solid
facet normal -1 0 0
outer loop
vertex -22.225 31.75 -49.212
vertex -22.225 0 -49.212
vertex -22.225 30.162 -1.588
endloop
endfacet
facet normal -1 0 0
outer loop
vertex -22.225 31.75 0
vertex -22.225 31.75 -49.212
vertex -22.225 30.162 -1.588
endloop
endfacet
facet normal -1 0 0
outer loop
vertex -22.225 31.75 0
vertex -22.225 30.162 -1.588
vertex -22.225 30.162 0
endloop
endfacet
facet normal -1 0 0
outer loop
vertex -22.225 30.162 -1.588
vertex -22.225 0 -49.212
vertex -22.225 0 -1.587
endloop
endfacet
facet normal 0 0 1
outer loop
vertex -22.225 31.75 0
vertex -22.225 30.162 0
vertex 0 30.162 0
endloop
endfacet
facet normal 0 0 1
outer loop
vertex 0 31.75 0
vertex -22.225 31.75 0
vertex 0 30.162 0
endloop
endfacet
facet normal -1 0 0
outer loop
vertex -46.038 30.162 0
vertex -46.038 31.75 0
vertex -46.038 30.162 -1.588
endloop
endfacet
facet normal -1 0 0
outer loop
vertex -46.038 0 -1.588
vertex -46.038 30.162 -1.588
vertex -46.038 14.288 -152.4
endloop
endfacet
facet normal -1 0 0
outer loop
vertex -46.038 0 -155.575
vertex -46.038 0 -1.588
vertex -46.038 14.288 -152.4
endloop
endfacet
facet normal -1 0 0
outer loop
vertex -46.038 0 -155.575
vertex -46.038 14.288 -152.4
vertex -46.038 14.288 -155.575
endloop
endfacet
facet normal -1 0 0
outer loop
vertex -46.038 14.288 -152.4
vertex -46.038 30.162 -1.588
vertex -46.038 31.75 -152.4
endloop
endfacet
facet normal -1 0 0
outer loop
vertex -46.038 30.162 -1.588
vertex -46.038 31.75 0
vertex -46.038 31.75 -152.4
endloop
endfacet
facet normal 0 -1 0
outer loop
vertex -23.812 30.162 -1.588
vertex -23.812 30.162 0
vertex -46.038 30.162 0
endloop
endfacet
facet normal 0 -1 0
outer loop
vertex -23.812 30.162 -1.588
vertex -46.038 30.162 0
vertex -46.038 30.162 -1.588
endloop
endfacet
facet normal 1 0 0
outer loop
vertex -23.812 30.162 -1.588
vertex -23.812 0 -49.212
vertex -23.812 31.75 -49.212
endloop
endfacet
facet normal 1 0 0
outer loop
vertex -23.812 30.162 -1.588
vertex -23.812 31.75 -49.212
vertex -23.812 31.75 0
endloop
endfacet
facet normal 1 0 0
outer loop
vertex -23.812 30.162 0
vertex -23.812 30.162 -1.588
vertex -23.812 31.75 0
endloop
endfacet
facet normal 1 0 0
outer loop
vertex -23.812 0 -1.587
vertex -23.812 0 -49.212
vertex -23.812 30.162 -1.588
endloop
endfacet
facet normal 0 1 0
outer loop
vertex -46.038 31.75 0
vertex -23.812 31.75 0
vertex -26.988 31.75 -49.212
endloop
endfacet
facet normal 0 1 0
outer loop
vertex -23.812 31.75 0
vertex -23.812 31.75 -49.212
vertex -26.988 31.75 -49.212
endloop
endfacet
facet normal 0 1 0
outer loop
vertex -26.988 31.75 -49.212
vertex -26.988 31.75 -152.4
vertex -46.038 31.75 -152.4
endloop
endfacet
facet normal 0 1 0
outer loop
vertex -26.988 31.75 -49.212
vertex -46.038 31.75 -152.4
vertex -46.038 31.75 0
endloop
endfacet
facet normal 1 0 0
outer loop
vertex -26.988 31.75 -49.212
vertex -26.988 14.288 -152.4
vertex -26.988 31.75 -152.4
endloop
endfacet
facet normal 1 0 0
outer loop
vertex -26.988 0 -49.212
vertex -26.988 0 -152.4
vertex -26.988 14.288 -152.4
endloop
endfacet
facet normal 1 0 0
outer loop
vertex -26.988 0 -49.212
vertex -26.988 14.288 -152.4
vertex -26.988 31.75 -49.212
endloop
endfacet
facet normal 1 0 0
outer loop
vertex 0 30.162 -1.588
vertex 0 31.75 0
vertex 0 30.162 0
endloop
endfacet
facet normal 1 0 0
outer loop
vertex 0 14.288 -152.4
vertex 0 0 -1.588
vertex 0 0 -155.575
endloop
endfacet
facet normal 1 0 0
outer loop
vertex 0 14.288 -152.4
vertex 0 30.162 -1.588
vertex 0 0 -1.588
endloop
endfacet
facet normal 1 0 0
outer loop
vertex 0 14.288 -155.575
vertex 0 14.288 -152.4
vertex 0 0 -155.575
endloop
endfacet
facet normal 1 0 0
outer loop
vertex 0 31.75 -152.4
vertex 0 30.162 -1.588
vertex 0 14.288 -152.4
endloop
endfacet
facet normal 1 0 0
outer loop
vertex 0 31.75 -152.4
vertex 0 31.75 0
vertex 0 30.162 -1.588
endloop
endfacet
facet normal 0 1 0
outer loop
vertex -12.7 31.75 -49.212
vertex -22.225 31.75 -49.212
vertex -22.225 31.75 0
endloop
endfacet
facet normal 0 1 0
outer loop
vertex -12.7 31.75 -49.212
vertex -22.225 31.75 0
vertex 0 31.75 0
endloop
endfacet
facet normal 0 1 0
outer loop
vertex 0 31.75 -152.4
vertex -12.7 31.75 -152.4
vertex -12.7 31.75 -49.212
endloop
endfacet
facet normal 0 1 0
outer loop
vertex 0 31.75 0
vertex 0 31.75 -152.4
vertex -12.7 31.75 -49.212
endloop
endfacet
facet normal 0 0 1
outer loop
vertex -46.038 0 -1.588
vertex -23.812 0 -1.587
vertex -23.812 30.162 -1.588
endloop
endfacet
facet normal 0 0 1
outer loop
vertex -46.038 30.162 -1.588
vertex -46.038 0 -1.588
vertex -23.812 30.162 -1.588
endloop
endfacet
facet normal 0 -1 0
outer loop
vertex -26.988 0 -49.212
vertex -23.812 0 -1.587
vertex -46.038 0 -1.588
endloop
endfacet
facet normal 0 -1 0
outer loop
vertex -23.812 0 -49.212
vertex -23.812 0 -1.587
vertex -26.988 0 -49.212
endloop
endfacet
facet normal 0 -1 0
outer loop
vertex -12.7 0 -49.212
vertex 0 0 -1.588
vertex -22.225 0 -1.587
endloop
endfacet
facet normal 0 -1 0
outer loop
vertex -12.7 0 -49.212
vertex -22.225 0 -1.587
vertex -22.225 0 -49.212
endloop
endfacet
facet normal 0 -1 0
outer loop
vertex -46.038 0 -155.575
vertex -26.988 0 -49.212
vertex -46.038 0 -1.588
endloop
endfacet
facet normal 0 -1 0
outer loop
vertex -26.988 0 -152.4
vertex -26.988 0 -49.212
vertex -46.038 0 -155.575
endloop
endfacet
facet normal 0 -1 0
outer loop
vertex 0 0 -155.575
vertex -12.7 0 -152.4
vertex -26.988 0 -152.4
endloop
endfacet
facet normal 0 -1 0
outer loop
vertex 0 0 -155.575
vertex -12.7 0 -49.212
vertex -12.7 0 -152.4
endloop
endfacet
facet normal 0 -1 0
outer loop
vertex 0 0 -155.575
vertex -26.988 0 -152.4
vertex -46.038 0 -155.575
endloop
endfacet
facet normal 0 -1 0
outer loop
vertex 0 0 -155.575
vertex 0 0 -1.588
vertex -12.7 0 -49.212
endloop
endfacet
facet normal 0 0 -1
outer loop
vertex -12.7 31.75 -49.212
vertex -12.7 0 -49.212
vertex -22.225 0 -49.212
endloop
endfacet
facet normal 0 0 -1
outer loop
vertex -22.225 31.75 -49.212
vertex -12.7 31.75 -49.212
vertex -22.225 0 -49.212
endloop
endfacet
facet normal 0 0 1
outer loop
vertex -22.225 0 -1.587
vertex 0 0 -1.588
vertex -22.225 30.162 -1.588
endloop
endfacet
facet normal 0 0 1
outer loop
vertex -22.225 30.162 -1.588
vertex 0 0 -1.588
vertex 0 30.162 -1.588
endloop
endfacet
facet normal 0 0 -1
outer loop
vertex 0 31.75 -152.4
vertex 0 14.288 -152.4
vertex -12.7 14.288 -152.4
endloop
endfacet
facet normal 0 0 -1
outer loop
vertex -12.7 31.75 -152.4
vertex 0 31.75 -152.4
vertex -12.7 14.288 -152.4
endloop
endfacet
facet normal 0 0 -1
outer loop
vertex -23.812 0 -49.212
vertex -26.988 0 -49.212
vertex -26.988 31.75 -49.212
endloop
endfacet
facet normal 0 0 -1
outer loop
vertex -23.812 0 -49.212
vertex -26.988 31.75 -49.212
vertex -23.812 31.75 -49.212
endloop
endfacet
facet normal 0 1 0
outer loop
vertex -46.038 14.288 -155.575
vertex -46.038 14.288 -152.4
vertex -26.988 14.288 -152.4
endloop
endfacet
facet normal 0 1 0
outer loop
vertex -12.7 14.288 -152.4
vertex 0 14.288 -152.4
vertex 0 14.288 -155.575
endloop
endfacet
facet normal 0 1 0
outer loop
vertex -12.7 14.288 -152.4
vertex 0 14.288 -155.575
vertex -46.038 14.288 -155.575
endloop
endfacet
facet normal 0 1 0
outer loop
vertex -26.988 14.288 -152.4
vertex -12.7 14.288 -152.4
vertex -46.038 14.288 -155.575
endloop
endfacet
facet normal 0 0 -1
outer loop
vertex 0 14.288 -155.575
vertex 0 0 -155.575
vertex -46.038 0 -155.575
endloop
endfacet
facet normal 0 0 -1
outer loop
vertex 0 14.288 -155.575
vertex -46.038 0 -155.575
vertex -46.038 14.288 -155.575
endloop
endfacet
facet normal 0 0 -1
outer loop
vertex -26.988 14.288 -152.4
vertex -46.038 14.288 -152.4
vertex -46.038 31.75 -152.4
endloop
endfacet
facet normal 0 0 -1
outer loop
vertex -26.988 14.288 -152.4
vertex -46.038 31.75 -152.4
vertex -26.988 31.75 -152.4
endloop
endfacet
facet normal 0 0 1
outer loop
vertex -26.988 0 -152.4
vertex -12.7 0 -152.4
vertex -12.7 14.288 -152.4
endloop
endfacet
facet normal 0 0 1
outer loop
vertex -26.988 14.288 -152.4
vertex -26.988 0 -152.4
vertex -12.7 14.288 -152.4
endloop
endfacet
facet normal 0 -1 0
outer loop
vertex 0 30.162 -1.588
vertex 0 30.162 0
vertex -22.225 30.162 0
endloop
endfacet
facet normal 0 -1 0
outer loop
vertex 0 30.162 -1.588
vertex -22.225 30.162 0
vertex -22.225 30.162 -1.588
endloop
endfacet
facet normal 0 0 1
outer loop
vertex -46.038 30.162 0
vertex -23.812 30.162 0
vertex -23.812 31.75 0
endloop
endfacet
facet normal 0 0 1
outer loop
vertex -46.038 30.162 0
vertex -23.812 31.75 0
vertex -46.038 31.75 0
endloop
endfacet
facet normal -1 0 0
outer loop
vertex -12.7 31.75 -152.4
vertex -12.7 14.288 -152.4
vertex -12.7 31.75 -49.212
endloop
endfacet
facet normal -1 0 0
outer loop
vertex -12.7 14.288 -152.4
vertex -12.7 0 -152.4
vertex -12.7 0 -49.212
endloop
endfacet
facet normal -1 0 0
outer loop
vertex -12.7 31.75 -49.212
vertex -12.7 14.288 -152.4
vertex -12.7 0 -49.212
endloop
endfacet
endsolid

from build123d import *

# Parameters (mm, degrees)
BOSS_EXTRUDE1_DEPTH   = 31.75
BOSS_EXTRUDE1_2_DEPTH = 31.75
SKETCH2_W             = 1.5875
SKETCH2_H             = 30.1625
CUT_EXTRUDE1_DEPTH    = 47.0375
SKETCH3_W             = 3.175
SKETCH3_H             = 14.2875
BOSS_EXTRUDE2_DEPTH   = 46.0375


with BuildPart() as part:
    # Sketch1 → Boss-Extrude1 (new body)
    with BuildSketch(Plane(origin=(0, 0, 0), x_dir=(1, 0, 0), z_dir=(0, 1, 0))):
        Polygon((0, 0), (0, 152.4), (-12.7, 152.4), (-12.7, 49.2125), (-22.225, 49.2125), (-22.225, 0), align=None)
    extrude(amount=BOSS_EXTRUDE1_DEPTH)


with BuildPart() as body_2:
    # Sketch1 → Boss-Extrude1 2 (new body)
    with BuildSketch(Plane(origin=(0, 0, 0), x_dir=(1, 0, 0), z_dir=(0, 1, 0))):
        Polygon((-23.8125, 0), (-46.0375, 0), (-46.0375, 152.4), (-26.9875, 152.4), (-26.9875, 49.2125), (-23.8125, 49.2125), align=None)
    extrude(amount=BOSS_EXTRUDE1_2_DEPTH)


with BuildPart() as cut_extrude1_tool:
    # Sketch2 → Cut-Extrude1 (new body, through all)
    with BuildSketch(Plane(origin=(0, 0, 0), x_dir=(0, 0, -1), z_dir=(1, 0, 0))):
        with Locations((0.79375, 15.08125)):
            Rectangle(SKETCH2_W, SKETCH2_H)
    extrude(amount=-CUT_EXTRUDE1_DEPTH)


with BuildPart() as part_1:
    add(part.part)

    # Cut-Extrude1: cut by cut_extrude1_tool
    add(cut_extrude1_tool.part, mode=Mode.SUBTRACT)



with BuildPart() as body_2_1:
    add(body_2.part)

    # Cut-Extrude1: cut by cut_extrude1_tool
    add(cut_extrude1_tool.part, mode=Mode.SUBTRACT)


with BuildPart() as part_2:
    add(part_1.part)

    add(body_2_1.part)  # Boss-Extrude2 merges body 2
    # Sketch3 → Boss-Extrude2 (add)
    with BuildSketch(Plane(origin=(0, 0, 0), x_dir=(0, 0, -1), z_dir=(1, 0, 0))):
        with Locations((153.9875, 7.14375)):
            Rectangle(SKETCH3_W, SKETCH3_H)
    extrude(amount=-BOSS_EXTRUDE2_DEPTH)


solid = part_2.part
